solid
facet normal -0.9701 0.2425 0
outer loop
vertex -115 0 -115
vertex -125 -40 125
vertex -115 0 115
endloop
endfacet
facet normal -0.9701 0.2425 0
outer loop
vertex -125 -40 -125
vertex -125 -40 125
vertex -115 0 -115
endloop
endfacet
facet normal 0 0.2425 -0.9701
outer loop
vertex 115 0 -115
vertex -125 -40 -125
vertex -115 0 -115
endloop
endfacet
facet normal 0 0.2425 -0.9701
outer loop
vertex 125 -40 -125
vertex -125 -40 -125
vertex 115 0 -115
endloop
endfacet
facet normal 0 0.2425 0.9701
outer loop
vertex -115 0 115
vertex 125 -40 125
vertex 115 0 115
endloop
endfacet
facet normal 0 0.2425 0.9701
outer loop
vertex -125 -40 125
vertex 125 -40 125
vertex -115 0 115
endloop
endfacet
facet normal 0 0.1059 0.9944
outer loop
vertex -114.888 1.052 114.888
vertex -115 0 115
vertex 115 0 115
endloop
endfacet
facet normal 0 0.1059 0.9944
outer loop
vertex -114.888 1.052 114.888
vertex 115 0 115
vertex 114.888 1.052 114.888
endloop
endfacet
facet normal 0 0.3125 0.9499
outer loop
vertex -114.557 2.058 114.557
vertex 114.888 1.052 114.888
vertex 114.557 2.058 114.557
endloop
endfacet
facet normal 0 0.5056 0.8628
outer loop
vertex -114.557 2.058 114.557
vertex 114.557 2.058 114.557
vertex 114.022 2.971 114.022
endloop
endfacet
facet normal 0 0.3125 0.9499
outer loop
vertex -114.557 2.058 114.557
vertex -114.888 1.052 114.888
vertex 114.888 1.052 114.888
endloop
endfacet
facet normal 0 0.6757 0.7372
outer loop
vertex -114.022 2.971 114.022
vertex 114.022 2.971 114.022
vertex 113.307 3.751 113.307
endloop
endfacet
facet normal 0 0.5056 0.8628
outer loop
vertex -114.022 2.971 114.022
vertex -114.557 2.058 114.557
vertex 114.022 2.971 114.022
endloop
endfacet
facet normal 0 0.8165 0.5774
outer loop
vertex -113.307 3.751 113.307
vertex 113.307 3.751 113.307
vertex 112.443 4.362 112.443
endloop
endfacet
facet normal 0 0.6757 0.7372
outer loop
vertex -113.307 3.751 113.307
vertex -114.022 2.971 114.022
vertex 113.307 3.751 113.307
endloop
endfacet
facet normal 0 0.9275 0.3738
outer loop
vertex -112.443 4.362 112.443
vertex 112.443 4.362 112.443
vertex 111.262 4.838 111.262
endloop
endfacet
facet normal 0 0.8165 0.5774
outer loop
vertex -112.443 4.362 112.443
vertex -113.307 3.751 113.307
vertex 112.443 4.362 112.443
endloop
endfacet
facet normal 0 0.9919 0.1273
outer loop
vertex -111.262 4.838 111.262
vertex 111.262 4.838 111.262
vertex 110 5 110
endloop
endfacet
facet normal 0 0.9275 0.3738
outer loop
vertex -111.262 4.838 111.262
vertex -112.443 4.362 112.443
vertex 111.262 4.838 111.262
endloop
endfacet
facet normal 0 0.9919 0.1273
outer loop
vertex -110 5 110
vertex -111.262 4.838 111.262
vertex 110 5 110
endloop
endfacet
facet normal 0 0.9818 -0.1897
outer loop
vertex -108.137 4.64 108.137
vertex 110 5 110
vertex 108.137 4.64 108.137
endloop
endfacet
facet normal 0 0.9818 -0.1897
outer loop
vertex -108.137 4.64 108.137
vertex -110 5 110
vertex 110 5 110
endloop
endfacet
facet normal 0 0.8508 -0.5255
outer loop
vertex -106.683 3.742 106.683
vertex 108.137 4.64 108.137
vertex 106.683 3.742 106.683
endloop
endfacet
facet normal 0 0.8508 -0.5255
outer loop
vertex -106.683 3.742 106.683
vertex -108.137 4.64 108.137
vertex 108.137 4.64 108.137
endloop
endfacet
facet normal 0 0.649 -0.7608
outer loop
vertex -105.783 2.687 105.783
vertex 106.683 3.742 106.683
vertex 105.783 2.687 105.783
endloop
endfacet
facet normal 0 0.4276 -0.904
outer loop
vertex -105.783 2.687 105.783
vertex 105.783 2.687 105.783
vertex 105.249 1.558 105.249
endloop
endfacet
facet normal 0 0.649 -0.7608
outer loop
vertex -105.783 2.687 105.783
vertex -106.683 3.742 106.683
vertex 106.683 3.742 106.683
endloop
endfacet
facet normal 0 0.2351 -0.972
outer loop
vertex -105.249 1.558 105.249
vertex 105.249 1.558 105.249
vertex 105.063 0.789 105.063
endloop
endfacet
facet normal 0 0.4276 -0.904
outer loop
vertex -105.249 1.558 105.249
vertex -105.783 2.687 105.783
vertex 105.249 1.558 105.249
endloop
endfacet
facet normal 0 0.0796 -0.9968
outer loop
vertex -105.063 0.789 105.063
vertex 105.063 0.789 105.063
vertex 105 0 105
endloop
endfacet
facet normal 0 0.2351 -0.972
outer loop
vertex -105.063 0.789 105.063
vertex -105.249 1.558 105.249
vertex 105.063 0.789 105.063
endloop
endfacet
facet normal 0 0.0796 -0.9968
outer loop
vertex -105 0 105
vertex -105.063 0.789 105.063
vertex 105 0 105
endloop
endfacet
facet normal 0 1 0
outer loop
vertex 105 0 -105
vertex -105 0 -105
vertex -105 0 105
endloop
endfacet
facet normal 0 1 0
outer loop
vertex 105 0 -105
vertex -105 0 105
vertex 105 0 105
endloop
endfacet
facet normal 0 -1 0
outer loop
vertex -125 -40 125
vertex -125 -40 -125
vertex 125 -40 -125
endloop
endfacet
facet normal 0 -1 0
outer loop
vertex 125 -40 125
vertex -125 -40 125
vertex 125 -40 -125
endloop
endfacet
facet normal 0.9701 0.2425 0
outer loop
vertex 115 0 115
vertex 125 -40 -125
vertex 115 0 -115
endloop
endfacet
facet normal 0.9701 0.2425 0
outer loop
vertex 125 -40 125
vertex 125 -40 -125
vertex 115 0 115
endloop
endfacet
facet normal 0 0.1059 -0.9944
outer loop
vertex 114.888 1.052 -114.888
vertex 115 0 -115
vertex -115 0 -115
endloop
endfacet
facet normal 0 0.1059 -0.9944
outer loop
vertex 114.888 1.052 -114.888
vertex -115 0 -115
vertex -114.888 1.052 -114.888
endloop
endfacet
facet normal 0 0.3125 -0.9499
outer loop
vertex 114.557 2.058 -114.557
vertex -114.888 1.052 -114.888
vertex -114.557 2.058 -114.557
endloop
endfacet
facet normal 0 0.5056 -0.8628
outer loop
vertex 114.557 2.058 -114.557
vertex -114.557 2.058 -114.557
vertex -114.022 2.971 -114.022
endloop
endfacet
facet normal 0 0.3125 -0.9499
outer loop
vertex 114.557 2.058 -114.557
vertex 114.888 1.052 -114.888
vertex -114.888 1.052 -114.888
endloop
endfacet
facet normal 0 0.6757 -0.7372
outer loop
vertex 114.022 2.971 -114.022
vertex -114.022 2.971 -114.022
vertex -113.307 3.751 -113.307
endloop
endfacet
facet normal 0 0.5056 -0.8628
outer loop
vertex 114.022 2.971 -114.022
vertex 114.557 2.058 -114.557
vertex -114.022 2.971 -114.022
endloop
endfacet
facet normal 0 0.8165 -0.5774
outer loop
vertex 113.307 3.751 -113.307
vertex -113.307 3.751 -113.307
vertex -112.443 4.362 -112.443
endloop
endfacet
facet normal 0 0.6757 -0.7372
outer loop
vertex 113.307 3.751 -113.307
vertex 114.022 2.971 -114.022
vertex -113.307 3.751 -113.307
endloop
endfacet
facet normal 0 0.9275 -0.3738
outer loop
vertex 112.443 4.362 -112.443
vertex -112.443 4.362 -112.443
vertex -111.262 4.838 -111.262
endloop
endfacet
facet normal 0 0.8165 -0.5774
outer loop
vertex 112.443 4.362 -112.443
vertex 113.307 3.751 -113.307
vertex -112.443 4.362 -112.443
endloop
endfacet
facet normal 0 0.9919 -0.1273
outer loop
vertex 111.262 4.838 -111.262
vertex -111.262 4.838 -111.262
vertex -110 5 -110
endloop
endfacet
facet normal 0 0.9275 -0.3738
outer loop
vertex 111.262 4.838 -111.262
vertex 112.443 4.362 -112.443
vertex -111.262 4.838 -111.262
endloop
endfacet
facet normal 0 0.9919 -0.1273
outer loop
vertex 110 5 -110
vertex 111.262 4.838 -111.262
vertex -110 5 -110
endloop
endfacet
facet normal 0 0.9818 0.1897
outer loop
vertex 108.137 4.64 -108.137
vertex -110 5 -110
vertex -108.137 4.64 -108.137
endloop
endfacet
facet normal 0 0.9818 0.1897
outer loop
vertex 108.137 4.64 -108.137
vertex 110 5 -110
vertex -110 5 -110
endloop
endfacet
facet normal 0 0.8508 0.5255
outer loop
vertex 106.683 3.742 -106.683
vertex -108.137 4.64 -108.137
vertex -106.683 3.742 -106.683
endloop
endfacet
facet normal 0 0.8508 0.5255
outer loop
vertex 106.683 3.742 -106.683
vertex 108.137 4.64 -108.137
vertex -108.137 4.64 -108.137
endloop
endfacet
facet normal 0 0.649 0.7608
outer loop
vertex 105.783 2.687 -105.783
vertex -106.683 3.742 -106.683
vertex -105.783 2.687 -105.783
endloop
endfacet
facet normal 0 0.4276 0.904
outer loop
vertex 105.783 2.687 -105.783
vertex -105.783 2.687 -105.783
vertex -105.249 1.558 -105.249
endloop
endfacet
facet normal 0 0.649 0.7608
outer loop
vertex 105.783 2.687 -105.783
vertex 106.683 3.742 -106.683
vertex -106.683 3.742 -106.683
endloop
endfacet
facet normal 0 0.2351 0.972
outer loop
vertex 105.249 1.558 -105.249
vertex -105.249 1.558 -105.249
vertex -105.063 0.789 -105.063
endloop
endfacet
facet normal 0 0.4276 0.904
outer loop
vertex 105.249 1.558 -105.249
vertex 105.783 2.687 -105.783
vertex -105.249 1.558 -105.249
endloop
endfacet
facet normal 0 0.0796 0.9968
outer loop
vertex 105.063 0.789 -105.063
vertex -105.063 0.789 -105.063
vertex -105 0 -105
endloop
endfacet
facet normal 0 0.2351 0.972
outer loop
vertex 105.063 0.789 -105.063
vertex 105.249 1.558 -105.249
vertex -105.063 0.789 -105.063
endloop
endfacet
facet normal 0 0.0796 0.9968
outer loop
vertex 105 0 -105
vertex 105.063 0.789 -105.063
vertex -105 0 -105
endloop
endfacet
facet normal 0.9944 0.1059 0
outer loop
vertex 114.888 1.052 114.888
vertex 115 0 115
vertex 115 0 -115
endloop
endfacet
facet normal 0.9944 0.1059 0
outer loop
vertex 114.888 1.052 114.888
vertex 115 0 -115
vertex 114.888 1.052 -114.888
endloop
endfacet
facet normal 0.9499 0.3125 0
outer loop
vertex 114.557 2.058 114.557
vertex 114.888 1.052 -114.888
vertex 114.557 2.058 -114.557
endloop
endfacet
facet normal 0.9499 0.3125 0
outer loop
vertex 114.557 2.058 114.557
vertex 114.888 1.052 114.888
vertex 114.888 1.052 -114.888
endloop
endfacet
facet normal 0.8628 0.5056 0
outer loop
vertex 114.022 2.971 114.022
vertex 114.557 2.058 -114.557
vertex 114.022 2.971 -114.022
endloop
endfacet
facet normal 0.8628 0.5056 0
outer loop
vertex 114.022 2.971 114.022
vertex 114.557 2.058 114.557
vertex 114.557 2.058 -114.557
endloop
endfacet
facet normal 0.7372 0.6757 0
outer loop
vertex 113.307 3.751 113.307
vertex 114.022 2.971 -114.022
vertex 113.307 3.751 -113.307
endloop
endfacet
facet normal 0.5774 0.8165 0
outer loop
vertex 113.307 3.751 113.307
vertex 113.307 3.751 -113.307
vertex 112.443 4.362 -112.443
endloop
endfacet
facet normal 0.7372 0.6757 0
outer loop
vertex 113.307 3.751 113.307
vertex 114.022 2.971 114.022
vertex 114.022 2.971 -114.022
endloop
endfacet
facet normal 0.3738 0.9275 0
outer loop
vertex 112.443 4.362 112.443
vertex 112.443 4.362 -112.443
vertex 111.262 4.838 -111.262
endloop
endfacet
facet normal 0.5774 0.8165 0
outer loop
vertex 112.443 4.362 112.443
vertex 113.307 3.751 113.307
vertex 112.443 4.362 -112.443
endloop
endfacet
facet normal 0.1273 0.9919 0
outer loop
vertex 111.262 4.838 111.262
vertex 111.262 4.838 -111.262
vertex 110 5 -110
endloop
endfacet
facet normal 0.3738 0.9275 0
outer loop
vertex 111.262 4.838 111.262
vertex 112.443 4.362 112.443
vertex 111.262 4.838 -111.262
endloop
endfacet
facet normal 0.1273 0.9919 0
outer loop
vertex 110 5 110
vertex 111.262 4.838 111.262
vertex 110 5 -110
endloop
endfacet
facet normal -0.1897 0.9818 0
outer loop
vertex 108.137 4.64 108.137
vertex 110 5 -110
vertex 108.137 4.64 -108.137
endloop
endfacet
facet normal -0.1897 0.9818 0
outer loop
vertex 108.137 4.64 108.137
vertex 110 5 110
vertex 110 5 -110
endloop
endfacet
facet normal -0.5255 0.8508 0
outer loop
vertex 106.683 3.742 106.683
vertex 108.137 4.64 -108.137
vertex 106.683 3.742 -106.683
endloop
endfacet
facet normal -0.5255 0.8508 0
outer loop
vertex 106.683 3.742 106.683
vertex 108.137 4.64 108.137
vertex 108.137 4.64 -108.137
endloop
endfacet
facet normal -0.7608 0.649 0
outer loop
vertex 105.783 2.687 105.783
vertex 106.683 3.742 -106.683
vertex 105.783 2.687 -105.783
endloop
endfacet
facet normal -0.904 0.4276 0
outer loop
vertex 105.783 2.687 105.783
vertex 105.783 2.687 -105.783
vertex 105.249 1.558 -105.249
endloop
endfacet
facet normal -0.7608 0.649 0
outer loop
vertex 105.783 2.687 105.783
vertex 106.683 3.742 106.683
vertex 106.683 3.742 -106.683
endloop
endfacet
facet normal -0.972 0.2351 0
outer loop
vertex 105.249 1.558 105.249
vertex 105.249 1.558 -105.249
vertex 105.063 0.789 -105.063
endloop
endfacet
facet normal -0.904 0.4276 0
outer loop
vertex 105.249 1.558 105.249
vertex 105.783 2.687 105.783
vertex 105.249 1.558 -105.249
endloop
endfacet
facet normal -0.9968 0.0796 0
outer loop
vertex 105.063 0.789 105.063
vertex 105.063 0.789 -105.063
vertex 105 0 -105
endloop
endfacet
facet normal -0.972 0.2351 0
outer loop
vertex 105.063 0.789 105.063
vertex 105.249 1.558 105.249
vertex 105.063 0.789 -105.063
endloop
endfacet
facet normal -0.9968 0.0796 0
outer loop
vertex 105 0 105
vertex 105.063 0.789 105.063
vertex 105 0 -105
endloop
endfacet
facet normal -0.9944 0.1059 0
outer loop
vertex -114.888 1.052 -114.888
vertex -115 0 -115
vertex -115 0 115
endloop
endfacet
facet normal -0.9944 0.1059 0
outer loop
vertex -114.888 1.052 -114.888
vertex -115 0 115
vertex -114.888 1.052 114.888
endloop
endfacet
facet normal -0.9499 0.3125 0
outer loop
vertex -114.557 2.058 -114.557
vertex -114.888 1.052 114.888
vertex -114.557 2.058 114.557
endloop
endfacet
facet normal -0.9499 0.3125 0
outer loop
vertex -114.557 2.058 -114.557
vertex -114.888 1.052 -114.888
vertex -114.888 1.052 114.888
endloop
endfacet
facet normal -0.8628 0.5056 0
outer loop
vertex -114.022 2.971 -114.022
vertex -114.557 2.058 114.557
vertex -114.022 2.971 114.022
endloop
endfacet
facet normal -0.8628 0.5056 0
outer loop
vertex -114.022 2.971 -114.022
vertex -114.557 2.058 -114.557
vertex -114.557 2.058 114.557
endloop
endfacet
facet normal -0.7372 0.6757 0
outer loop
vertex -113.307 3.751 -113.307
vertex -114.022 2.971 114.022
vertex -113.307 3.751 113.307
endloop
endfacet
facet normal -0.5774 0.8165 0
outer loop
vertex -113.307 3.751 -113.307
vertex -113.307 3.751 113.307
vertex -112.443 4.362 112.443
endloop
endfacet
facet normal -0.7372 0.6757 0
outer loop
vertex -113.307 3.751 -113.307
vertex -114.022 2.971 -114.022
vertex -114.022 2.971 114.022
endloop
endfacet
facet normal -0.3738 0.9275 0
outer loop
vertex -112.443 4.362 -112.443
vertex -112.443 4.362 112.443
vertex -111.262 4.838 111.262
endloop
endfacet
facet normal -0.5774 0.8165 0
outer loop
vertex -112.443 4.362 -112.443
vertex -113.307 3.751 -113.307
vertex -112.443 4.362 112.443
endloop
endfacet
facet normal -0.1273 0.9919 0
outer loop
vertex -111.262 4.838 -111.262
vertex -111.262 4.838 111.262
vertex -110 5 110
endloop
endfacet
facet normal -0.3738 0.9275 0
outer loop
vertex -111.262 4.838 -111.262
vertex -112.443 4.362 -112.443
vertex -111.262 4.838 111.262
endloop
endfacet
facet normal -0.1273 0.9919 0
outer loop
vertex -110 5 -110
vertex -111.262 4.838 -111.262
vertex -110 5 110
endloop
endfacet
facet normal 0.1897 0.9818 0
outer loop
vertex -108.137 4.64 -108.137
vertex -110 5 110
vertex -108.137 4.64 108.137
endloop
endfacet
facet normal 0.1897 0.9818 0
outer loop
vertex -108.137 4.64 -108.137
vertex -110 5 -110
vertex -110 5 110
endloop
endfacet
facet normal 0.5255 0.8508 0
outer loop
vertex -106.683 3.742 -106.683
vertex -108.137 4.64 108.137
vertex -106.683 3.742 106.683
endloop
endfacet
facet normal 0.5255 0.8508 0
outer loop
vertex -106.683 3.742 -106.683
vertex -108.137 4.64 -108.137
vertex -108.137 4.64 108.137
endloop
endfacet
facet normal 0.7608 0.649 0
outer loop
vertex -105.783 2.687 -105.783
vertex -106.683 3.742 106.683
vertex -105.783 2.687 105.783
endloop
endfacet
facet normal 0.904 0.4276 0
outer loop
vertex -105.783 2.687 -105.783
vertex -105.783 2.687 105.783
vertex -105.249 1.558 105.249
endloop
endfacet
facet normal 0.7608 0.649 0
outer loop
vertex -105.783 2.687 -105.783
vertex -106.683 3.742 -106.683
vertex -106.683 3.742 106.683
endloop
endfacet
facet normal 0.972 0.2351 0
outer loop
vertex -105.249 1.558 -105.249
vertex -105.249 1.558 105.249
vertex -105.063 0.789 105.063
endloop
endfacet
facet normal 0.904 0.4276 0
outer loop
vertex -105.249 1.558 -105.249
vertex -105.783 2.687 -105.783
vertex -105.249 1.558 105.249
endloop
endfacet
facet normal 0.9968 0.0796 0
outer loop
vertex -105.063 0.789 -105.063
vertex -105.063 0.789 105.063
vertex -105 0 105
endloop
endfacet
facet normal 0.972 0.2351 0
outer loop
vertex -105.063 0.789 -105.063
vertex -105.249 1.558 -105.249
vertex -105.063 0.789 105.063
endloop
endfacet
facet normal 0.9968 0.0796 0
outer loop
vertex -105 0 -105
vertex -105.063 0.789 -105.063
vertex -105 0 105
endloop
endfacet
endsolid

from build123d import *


with BuildPart() as part:
    # 草图2 → 放样1 section 0
    with BuildSketch(Plane(origin=(0, 0, 0), x_dir=(1, 0, 0), z_dir=(0, 1, 0))):
        with BuildLine():
            Line((-115, -115), (-115, 115))
            Line((-115, 115), (115, 115))
            Line((115, 115), (115, -115))
            Line((115, -115), (-115, -115))
        make_face()
    # 草图3 → 放样1 section 1
    with BuildSketch(Plane(origin=(0, -40, 0), x_dir=(1, 0, 0), z_dir=(0, 1, 0))):
        with BuildLine():
            Line((125, -125), (125, 125))
            Line((125, 125), (-125, 125))
            Line((-125, 125), (-125, -125))
            Line((-125, -125), (125, -125))
        make_face()
    loft()

    # 扫描1: sweep along a path in 草图2<2>
    with BuildLine(Plane(origin=(0, 0, 0), x_dir=(1, 0, 0), z_dir=(0, 1, 0))) as sweep_1_path:
        Line((-115, -115), (-115, 115))
        Line((-115, 115), (115, 115))
        Line((115, 115), (115, -115))
        Line((115, -115), (-115, -115))
    # 草图4 → 扫描1 (sweep)
    with BuildSketch(Plane(origin=(0, 0, 115), x_dir=(-1, 0, 0), z_dir=(0, 0, -1))):
        with BuildLine():
            Line((-115, 0), (-105, 0))
            ThreePointArc((-105, 0), (-110, 5), (-115, 0))
        make_face()
    sweep(path=sweep_1_path.line, transition=Transition.RIGHT)


solid = part.part
